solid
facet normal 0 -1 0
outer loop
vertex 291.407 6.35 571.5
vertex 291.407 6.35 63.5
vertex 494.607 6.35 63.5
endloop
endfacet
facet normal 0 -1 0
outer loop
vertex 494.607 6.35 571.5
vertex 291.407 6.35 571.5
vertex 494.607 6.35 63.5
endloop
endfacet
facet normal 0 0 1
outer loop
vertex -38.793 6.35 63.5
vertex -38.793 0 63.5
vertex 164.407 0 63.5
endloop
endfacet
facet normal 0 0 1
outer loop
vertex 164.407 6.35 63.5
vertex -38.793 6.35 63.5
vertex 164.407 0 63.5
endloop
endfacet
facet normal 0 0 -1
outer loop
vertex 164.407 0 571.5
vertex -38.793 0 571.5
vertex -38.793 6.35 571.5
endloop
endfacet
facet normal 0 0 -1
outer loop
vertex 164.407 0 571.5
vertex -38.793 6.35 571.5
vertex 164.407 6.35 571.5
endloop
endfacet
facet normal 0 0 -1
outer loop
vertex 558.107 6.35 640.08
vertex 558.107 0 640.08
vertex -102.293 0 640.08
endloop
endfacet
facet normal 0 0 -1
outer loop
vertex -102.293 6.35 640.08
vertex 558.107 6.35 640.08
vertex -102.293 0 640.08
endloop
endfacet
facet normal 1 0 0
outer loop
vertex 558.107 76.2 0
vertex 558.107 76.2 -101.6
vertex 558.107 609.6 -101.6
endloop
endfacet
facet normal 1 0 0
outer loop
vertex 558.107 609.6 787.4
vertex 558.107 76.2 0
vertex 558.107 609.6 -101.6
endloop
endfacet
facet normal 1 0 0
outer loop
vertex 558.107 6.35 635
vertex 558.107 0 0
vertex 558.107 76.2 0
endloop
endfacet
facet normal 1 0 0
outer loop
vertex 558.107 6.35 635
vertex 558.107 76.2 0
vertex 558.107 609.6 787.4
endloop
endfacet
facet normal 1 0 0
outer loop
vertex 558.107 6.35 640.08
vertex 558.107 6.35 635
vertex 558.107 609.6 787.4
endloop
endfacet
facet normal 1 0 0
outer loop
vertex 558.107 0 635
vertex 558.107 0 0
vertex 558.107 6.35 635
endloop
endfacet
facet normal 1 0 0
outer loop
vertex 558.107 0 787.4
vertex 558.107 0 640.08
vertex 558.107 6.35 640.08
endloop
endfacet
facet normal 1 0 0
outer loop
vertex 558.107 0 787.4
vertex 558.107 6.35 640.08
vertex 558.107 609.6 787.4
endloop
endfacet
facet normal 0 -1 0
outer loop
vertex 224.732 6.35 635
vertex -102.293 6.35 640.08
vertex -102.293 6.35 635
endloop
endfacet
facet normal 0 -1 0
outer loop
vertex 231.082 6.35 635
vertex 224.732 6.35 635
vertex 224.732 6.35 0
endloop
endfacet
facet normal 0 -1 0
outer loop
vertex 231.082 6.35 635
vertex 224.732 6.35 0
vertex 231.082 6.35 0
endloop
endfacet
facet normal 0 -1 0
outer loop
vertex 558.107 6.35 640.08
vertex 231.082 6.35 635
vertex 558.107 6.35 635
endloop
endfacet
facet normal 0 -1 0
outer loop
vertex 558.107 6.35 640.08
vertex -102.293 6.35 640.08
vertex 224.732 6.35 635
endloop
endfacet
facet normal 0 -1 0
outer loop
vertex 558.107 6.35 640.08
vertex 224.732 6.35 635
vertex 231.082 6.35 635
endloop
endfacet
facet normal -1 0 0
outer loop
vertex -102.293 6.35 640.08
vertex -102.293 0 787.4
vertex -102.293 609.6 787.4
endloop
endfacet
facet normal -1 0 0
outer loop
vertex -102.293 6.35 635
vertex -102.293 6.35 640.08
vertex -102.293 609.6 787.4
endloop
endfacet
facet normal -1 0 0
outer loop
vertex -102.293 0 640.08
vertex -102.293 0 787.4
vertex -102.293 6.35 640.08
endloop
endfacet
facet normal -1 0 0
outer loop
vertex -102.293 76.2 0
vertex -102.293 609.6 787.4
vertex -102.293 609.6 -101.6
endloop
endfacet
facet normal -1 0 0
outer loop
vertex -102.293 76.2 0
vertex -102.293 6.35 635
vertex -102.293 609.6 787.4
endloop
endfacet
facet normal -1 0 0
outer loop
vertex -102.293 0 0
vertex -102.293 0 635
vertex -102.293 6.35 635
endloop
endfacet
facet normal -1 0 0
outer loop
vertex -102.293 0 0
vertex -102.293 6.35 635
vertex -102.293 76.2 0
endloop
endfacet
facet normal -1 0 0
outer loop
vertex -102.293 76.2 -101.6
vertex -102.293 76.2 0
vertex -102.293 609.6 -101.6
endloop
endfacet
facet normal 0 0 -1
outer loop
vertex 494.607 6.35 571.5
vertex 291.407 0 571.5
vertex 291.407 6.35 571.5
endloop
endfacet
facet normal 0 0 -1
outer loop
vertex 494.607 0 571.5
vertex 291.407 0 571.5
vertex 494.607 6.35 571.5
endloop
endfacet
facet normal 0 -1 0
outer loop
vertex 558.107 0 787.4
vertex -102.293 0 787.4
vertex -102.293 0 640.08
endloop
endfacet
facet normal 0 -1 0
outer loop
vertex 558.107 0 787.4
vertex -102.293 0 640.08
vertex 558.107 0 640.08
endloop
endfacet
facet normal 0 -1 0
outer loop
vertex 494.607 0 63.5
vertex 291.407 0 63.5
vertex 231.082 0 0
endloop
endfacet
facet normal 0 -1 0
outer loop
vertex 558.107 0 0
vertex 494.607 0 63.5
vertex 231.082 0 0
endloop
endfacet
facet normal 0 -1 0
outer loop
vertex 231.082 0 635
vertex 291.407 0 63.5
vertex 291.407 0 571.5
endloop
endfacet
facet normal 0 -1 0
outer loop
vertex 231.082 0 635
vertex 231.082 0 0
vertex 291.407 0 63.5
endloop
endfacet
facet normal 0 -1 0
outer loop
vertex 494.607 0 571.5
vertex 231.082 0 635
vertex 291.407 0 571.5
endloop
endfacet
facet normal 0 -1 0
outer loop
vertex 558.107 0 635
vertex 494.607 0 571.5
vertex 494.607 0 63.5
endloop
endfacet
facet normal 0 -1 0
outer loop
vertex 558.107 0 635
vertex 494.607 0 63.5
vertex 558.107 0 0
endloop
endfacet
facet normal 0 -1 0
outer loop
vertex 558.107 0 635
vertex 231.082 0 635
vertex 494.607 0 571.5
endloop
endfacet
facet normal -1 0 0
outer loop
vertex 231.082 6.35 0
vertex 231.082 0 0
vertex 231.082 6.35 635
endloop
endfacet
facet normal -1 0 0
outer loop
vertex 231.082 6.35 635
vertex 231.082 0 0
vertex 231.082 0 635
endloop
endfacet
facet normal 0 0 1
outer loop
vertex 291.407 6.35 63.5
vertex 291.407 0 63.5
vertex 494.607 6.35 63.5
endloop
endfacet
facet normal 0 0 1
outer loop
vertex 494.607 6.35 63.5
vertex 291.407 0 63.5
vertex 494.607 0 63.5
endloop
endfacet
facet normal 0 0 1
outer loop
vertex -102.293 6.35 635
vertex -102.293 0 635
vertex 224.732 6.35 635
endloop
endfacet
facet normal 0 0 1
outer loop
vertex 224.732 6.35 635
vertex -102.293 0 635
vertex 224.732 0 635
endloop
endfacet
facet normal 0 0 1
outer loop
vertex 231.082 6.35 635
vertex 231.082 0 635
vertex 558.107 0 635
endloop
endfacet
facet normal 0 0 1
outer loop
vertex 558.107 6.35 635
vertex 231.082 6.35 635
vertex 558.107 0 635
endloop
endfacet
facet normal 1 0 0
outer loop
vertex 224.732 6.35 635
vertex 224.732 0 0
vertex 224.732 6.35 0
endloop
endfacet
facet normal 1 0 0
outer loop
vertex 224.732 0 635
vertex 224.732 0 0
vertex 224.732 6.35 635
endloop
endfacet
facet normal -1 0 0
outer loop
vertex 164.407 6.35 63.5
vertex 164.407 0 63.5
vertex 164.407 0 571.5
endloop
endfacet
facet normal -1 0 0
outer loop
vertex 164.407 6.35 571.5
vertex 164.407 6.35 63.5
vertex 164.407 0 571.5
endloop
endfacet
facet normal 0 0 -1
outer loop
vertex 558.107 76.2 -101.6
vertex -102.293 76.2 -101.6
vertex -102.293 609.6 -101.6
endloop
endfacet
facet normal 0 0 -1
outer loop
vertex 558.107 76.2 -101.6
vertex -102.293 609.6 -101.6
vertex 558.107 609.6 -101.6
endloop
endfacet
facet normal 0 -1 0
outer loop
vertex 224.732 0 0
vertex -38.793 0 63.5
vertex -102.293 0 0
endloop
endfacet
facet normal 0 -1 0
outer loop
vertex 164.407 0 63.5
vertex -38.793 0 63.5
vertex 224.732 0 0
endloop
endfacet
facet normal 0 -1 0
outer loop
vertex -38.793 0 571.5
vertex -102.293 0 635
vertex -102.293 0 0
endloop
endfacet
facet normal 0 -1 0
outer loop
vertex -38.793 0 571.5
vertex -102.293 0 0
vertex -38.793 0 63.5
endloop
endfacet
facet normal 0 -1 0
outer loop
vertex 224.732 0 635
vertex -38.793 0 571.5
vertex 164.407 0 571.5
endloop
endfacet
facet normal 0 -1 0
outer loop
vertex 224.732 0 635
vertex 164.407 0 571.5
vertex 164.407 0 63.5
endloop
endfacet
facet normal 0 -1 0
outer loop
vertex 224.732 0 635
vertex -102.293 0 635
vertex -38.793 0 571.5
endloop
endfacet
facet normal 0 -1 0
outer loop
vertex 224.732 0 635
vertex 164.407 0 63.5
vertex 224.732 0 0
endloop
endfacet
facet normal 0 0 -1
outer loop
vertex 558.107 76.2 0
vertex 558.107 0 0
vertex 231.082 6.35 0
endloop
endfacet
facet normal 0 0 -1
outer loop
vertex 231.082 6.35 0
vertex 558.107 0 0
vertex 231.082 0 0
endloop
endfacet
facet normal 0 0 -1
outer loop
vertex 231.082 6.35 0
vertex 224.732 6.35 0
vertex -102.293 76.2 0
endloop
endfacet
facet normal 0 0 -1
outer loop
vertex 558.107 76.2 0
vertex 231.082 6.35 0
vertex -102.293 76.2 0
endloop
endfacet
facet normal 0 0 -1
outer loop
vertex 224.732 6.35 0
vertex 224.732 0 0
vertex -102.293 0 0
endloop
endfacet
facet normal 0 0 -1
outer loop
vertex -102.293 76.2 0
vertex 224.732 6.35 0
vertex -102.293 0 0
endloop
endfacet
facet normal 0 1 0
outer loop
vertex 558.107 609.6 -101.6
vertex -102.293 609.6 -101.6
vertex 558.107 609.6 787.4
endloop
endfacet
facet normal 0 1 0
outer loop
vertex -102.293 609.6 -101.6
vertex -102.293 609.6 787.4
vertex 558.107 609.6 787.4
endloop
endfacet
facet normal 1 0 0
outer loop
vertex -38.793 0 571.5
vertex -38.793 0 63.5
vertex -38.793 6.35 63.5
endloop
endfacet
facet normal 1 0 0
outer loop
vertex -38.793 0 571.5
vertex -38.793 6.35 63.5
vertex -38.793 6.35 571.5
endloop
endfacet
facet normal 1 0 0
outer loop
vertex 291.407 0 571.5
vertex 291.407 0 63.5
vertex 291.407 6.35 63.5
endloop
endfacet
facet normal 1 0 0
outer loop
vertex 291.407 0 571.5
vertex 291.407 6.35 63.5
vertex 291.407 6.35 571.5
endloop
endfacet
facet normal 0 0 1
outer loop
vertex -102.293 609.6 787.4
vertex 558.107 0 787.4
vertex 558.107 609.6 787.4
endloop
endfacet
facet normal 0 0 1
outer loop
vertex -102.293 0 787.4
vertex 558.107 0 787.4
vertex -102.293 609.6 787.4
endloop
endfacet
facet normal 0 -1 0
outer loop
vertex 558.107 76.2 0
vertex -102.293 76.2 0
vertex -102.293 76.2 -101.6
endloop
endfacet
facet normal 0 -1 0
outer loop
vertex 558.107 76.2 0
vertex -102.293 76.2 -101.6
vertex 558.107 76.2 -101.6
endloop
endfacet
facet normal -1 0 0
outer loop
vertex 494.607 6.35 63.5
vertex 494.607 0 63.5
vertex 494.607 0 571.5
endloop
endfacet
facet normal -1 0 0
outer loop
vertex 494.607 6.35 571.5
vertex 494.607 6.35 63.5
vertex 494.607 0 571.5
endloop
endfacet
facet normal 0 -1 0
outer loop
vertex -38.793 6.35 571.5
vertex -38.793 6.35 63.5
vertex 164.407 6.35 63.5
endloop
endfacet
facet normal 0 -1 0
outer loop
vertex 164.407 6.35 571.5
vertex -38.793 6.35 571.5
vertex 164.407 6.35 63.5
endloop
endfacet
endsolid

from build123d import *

# Parameters (mm, degrees)
F0_W     = 3.175
F0_H     = 635
F0_W_2   = 327.025
F0_W_3   = 203.2
F0_H_2   = 508
F0_W_4   = 330.2
F0_H_3   = 147.32
F1_DEPTH = 609.6
F2_DEPTH = 6.35
F3_DEPTH = 76.2


with BuildPart() as f1:
    # F0 (on Front) → F1 (new body)
    with BuildSketch(Plane.XZ):
        Polygon((227.9072425127, -101.6), (227.9072425127, 0), (224.7322425127, 0), (-102.2927574873, 0), (-102.2927574873, -101.6), align=None)
        with Locations((226.3197425127, 317.5)):
            Rectangle(F0_W, F0_H)
        Polygon((231.0822425127, 0), (227.9072425127, 0), (227.9072425127, -101.6), (558.1072425127, -101.6), (558.1072425127, 0), align=None)
        with Locations((229.4947425127, 317.5)):
            Rectangle(F0_W, F0_H)
        with Locations((61.2197425127, 317.5)):
            Rectangle(F0_W_2, F0_H)
        with Locations((62.8072425127, 317.5)):
            Rectangle(F0_W_3, F0_H_2, mode=Mode.SUBTRACT)
        Polygon((224.7322425127, 635), (227.9072425127, 635), (227.9072425127, 640.08), (-102.2927574873, 640.08), (-102.2927574873, 635), align=None)
        Polygon((227.9072425127, 640.08), (227.9072425127, 635), (231.0822425127, 635), (558.1072425127, 635), (558.1072425127, 640.08), align=None)
        with Locations((394.5947425127, 317.5)):
            Rectangle(F0_W_2, F0_H)
        with Locations((393.0072425127, 317.5)):
            Rectangle(F0_W_3, F0_H_2, mode=Mode.SUBTRACT)
        with Locations((62.8072425127, 713.74)):
            Rectangle(F0_W_4, F0_H_3)
        with Locations((393.0072425127, 713.74)):
            Rectangle(F0_W_4, F0_H_3)
        with Locations((62.8072425127, 317.5)):
            Rectangle(F0_W_3, F0_H_2)
        with Locations((393.0072425127, 317.5)):
            Rectangle(F0_W_3, F0_H_2)
    extrude(amount=-F1_DEPTH)

    # F0 (on Front) → F2 (cut)
    with BuildSketch(Plane.XZ):
        with Locations((226.3197425127, 317.5)):
            Rectangle(F0_W, F0_H)
        with Locations((229.4947425127, 317.5)):
            Rectangle(F0_W, F0_H)
        Polygon((224.7322425127, 635), (227.9072425127, 635), (227.9072425127, 640.08), (-102.2927574873, 640.08), (-102.2927574873, 635), align=None)
        Polygon((227.9072425127, 640.08), (227.9072425127, 635), (231.0822425127, 635), (558.1072425127, 635), (558.1072425127, 640.08), align=None)
        with Locations((62.8072425127, 317.5)):
            Rectangle(F0_W_3, F0_H_2)
        with Locations((393.0072425127, 317.5)):
            Rectangle(F0_W_3, F0_H_2)
    extrude(amount=-F2_DEPTH, mode=Mode.SUBTRACT)

    # F0 (on Front) → F3 (cut)
    with BuildSketch(Plane.XZ):
        Polygon((227.9072425127, -101.6), (227.9072425127, 0), (224.7322425127, 0), (-102.2927574873, 0), (-102.2927574873, -101.6), align=None)
        Polygon((231.0822425127, 0), (227.9072425127, 0), (227.9072425127, -101.6), (558.1072425127, -101.6), (558.1072425127, 0), align=None)
    extrude(amount=-F3_DEPTH, mode=Mode.SUBTRACT)


solid = f1.part
